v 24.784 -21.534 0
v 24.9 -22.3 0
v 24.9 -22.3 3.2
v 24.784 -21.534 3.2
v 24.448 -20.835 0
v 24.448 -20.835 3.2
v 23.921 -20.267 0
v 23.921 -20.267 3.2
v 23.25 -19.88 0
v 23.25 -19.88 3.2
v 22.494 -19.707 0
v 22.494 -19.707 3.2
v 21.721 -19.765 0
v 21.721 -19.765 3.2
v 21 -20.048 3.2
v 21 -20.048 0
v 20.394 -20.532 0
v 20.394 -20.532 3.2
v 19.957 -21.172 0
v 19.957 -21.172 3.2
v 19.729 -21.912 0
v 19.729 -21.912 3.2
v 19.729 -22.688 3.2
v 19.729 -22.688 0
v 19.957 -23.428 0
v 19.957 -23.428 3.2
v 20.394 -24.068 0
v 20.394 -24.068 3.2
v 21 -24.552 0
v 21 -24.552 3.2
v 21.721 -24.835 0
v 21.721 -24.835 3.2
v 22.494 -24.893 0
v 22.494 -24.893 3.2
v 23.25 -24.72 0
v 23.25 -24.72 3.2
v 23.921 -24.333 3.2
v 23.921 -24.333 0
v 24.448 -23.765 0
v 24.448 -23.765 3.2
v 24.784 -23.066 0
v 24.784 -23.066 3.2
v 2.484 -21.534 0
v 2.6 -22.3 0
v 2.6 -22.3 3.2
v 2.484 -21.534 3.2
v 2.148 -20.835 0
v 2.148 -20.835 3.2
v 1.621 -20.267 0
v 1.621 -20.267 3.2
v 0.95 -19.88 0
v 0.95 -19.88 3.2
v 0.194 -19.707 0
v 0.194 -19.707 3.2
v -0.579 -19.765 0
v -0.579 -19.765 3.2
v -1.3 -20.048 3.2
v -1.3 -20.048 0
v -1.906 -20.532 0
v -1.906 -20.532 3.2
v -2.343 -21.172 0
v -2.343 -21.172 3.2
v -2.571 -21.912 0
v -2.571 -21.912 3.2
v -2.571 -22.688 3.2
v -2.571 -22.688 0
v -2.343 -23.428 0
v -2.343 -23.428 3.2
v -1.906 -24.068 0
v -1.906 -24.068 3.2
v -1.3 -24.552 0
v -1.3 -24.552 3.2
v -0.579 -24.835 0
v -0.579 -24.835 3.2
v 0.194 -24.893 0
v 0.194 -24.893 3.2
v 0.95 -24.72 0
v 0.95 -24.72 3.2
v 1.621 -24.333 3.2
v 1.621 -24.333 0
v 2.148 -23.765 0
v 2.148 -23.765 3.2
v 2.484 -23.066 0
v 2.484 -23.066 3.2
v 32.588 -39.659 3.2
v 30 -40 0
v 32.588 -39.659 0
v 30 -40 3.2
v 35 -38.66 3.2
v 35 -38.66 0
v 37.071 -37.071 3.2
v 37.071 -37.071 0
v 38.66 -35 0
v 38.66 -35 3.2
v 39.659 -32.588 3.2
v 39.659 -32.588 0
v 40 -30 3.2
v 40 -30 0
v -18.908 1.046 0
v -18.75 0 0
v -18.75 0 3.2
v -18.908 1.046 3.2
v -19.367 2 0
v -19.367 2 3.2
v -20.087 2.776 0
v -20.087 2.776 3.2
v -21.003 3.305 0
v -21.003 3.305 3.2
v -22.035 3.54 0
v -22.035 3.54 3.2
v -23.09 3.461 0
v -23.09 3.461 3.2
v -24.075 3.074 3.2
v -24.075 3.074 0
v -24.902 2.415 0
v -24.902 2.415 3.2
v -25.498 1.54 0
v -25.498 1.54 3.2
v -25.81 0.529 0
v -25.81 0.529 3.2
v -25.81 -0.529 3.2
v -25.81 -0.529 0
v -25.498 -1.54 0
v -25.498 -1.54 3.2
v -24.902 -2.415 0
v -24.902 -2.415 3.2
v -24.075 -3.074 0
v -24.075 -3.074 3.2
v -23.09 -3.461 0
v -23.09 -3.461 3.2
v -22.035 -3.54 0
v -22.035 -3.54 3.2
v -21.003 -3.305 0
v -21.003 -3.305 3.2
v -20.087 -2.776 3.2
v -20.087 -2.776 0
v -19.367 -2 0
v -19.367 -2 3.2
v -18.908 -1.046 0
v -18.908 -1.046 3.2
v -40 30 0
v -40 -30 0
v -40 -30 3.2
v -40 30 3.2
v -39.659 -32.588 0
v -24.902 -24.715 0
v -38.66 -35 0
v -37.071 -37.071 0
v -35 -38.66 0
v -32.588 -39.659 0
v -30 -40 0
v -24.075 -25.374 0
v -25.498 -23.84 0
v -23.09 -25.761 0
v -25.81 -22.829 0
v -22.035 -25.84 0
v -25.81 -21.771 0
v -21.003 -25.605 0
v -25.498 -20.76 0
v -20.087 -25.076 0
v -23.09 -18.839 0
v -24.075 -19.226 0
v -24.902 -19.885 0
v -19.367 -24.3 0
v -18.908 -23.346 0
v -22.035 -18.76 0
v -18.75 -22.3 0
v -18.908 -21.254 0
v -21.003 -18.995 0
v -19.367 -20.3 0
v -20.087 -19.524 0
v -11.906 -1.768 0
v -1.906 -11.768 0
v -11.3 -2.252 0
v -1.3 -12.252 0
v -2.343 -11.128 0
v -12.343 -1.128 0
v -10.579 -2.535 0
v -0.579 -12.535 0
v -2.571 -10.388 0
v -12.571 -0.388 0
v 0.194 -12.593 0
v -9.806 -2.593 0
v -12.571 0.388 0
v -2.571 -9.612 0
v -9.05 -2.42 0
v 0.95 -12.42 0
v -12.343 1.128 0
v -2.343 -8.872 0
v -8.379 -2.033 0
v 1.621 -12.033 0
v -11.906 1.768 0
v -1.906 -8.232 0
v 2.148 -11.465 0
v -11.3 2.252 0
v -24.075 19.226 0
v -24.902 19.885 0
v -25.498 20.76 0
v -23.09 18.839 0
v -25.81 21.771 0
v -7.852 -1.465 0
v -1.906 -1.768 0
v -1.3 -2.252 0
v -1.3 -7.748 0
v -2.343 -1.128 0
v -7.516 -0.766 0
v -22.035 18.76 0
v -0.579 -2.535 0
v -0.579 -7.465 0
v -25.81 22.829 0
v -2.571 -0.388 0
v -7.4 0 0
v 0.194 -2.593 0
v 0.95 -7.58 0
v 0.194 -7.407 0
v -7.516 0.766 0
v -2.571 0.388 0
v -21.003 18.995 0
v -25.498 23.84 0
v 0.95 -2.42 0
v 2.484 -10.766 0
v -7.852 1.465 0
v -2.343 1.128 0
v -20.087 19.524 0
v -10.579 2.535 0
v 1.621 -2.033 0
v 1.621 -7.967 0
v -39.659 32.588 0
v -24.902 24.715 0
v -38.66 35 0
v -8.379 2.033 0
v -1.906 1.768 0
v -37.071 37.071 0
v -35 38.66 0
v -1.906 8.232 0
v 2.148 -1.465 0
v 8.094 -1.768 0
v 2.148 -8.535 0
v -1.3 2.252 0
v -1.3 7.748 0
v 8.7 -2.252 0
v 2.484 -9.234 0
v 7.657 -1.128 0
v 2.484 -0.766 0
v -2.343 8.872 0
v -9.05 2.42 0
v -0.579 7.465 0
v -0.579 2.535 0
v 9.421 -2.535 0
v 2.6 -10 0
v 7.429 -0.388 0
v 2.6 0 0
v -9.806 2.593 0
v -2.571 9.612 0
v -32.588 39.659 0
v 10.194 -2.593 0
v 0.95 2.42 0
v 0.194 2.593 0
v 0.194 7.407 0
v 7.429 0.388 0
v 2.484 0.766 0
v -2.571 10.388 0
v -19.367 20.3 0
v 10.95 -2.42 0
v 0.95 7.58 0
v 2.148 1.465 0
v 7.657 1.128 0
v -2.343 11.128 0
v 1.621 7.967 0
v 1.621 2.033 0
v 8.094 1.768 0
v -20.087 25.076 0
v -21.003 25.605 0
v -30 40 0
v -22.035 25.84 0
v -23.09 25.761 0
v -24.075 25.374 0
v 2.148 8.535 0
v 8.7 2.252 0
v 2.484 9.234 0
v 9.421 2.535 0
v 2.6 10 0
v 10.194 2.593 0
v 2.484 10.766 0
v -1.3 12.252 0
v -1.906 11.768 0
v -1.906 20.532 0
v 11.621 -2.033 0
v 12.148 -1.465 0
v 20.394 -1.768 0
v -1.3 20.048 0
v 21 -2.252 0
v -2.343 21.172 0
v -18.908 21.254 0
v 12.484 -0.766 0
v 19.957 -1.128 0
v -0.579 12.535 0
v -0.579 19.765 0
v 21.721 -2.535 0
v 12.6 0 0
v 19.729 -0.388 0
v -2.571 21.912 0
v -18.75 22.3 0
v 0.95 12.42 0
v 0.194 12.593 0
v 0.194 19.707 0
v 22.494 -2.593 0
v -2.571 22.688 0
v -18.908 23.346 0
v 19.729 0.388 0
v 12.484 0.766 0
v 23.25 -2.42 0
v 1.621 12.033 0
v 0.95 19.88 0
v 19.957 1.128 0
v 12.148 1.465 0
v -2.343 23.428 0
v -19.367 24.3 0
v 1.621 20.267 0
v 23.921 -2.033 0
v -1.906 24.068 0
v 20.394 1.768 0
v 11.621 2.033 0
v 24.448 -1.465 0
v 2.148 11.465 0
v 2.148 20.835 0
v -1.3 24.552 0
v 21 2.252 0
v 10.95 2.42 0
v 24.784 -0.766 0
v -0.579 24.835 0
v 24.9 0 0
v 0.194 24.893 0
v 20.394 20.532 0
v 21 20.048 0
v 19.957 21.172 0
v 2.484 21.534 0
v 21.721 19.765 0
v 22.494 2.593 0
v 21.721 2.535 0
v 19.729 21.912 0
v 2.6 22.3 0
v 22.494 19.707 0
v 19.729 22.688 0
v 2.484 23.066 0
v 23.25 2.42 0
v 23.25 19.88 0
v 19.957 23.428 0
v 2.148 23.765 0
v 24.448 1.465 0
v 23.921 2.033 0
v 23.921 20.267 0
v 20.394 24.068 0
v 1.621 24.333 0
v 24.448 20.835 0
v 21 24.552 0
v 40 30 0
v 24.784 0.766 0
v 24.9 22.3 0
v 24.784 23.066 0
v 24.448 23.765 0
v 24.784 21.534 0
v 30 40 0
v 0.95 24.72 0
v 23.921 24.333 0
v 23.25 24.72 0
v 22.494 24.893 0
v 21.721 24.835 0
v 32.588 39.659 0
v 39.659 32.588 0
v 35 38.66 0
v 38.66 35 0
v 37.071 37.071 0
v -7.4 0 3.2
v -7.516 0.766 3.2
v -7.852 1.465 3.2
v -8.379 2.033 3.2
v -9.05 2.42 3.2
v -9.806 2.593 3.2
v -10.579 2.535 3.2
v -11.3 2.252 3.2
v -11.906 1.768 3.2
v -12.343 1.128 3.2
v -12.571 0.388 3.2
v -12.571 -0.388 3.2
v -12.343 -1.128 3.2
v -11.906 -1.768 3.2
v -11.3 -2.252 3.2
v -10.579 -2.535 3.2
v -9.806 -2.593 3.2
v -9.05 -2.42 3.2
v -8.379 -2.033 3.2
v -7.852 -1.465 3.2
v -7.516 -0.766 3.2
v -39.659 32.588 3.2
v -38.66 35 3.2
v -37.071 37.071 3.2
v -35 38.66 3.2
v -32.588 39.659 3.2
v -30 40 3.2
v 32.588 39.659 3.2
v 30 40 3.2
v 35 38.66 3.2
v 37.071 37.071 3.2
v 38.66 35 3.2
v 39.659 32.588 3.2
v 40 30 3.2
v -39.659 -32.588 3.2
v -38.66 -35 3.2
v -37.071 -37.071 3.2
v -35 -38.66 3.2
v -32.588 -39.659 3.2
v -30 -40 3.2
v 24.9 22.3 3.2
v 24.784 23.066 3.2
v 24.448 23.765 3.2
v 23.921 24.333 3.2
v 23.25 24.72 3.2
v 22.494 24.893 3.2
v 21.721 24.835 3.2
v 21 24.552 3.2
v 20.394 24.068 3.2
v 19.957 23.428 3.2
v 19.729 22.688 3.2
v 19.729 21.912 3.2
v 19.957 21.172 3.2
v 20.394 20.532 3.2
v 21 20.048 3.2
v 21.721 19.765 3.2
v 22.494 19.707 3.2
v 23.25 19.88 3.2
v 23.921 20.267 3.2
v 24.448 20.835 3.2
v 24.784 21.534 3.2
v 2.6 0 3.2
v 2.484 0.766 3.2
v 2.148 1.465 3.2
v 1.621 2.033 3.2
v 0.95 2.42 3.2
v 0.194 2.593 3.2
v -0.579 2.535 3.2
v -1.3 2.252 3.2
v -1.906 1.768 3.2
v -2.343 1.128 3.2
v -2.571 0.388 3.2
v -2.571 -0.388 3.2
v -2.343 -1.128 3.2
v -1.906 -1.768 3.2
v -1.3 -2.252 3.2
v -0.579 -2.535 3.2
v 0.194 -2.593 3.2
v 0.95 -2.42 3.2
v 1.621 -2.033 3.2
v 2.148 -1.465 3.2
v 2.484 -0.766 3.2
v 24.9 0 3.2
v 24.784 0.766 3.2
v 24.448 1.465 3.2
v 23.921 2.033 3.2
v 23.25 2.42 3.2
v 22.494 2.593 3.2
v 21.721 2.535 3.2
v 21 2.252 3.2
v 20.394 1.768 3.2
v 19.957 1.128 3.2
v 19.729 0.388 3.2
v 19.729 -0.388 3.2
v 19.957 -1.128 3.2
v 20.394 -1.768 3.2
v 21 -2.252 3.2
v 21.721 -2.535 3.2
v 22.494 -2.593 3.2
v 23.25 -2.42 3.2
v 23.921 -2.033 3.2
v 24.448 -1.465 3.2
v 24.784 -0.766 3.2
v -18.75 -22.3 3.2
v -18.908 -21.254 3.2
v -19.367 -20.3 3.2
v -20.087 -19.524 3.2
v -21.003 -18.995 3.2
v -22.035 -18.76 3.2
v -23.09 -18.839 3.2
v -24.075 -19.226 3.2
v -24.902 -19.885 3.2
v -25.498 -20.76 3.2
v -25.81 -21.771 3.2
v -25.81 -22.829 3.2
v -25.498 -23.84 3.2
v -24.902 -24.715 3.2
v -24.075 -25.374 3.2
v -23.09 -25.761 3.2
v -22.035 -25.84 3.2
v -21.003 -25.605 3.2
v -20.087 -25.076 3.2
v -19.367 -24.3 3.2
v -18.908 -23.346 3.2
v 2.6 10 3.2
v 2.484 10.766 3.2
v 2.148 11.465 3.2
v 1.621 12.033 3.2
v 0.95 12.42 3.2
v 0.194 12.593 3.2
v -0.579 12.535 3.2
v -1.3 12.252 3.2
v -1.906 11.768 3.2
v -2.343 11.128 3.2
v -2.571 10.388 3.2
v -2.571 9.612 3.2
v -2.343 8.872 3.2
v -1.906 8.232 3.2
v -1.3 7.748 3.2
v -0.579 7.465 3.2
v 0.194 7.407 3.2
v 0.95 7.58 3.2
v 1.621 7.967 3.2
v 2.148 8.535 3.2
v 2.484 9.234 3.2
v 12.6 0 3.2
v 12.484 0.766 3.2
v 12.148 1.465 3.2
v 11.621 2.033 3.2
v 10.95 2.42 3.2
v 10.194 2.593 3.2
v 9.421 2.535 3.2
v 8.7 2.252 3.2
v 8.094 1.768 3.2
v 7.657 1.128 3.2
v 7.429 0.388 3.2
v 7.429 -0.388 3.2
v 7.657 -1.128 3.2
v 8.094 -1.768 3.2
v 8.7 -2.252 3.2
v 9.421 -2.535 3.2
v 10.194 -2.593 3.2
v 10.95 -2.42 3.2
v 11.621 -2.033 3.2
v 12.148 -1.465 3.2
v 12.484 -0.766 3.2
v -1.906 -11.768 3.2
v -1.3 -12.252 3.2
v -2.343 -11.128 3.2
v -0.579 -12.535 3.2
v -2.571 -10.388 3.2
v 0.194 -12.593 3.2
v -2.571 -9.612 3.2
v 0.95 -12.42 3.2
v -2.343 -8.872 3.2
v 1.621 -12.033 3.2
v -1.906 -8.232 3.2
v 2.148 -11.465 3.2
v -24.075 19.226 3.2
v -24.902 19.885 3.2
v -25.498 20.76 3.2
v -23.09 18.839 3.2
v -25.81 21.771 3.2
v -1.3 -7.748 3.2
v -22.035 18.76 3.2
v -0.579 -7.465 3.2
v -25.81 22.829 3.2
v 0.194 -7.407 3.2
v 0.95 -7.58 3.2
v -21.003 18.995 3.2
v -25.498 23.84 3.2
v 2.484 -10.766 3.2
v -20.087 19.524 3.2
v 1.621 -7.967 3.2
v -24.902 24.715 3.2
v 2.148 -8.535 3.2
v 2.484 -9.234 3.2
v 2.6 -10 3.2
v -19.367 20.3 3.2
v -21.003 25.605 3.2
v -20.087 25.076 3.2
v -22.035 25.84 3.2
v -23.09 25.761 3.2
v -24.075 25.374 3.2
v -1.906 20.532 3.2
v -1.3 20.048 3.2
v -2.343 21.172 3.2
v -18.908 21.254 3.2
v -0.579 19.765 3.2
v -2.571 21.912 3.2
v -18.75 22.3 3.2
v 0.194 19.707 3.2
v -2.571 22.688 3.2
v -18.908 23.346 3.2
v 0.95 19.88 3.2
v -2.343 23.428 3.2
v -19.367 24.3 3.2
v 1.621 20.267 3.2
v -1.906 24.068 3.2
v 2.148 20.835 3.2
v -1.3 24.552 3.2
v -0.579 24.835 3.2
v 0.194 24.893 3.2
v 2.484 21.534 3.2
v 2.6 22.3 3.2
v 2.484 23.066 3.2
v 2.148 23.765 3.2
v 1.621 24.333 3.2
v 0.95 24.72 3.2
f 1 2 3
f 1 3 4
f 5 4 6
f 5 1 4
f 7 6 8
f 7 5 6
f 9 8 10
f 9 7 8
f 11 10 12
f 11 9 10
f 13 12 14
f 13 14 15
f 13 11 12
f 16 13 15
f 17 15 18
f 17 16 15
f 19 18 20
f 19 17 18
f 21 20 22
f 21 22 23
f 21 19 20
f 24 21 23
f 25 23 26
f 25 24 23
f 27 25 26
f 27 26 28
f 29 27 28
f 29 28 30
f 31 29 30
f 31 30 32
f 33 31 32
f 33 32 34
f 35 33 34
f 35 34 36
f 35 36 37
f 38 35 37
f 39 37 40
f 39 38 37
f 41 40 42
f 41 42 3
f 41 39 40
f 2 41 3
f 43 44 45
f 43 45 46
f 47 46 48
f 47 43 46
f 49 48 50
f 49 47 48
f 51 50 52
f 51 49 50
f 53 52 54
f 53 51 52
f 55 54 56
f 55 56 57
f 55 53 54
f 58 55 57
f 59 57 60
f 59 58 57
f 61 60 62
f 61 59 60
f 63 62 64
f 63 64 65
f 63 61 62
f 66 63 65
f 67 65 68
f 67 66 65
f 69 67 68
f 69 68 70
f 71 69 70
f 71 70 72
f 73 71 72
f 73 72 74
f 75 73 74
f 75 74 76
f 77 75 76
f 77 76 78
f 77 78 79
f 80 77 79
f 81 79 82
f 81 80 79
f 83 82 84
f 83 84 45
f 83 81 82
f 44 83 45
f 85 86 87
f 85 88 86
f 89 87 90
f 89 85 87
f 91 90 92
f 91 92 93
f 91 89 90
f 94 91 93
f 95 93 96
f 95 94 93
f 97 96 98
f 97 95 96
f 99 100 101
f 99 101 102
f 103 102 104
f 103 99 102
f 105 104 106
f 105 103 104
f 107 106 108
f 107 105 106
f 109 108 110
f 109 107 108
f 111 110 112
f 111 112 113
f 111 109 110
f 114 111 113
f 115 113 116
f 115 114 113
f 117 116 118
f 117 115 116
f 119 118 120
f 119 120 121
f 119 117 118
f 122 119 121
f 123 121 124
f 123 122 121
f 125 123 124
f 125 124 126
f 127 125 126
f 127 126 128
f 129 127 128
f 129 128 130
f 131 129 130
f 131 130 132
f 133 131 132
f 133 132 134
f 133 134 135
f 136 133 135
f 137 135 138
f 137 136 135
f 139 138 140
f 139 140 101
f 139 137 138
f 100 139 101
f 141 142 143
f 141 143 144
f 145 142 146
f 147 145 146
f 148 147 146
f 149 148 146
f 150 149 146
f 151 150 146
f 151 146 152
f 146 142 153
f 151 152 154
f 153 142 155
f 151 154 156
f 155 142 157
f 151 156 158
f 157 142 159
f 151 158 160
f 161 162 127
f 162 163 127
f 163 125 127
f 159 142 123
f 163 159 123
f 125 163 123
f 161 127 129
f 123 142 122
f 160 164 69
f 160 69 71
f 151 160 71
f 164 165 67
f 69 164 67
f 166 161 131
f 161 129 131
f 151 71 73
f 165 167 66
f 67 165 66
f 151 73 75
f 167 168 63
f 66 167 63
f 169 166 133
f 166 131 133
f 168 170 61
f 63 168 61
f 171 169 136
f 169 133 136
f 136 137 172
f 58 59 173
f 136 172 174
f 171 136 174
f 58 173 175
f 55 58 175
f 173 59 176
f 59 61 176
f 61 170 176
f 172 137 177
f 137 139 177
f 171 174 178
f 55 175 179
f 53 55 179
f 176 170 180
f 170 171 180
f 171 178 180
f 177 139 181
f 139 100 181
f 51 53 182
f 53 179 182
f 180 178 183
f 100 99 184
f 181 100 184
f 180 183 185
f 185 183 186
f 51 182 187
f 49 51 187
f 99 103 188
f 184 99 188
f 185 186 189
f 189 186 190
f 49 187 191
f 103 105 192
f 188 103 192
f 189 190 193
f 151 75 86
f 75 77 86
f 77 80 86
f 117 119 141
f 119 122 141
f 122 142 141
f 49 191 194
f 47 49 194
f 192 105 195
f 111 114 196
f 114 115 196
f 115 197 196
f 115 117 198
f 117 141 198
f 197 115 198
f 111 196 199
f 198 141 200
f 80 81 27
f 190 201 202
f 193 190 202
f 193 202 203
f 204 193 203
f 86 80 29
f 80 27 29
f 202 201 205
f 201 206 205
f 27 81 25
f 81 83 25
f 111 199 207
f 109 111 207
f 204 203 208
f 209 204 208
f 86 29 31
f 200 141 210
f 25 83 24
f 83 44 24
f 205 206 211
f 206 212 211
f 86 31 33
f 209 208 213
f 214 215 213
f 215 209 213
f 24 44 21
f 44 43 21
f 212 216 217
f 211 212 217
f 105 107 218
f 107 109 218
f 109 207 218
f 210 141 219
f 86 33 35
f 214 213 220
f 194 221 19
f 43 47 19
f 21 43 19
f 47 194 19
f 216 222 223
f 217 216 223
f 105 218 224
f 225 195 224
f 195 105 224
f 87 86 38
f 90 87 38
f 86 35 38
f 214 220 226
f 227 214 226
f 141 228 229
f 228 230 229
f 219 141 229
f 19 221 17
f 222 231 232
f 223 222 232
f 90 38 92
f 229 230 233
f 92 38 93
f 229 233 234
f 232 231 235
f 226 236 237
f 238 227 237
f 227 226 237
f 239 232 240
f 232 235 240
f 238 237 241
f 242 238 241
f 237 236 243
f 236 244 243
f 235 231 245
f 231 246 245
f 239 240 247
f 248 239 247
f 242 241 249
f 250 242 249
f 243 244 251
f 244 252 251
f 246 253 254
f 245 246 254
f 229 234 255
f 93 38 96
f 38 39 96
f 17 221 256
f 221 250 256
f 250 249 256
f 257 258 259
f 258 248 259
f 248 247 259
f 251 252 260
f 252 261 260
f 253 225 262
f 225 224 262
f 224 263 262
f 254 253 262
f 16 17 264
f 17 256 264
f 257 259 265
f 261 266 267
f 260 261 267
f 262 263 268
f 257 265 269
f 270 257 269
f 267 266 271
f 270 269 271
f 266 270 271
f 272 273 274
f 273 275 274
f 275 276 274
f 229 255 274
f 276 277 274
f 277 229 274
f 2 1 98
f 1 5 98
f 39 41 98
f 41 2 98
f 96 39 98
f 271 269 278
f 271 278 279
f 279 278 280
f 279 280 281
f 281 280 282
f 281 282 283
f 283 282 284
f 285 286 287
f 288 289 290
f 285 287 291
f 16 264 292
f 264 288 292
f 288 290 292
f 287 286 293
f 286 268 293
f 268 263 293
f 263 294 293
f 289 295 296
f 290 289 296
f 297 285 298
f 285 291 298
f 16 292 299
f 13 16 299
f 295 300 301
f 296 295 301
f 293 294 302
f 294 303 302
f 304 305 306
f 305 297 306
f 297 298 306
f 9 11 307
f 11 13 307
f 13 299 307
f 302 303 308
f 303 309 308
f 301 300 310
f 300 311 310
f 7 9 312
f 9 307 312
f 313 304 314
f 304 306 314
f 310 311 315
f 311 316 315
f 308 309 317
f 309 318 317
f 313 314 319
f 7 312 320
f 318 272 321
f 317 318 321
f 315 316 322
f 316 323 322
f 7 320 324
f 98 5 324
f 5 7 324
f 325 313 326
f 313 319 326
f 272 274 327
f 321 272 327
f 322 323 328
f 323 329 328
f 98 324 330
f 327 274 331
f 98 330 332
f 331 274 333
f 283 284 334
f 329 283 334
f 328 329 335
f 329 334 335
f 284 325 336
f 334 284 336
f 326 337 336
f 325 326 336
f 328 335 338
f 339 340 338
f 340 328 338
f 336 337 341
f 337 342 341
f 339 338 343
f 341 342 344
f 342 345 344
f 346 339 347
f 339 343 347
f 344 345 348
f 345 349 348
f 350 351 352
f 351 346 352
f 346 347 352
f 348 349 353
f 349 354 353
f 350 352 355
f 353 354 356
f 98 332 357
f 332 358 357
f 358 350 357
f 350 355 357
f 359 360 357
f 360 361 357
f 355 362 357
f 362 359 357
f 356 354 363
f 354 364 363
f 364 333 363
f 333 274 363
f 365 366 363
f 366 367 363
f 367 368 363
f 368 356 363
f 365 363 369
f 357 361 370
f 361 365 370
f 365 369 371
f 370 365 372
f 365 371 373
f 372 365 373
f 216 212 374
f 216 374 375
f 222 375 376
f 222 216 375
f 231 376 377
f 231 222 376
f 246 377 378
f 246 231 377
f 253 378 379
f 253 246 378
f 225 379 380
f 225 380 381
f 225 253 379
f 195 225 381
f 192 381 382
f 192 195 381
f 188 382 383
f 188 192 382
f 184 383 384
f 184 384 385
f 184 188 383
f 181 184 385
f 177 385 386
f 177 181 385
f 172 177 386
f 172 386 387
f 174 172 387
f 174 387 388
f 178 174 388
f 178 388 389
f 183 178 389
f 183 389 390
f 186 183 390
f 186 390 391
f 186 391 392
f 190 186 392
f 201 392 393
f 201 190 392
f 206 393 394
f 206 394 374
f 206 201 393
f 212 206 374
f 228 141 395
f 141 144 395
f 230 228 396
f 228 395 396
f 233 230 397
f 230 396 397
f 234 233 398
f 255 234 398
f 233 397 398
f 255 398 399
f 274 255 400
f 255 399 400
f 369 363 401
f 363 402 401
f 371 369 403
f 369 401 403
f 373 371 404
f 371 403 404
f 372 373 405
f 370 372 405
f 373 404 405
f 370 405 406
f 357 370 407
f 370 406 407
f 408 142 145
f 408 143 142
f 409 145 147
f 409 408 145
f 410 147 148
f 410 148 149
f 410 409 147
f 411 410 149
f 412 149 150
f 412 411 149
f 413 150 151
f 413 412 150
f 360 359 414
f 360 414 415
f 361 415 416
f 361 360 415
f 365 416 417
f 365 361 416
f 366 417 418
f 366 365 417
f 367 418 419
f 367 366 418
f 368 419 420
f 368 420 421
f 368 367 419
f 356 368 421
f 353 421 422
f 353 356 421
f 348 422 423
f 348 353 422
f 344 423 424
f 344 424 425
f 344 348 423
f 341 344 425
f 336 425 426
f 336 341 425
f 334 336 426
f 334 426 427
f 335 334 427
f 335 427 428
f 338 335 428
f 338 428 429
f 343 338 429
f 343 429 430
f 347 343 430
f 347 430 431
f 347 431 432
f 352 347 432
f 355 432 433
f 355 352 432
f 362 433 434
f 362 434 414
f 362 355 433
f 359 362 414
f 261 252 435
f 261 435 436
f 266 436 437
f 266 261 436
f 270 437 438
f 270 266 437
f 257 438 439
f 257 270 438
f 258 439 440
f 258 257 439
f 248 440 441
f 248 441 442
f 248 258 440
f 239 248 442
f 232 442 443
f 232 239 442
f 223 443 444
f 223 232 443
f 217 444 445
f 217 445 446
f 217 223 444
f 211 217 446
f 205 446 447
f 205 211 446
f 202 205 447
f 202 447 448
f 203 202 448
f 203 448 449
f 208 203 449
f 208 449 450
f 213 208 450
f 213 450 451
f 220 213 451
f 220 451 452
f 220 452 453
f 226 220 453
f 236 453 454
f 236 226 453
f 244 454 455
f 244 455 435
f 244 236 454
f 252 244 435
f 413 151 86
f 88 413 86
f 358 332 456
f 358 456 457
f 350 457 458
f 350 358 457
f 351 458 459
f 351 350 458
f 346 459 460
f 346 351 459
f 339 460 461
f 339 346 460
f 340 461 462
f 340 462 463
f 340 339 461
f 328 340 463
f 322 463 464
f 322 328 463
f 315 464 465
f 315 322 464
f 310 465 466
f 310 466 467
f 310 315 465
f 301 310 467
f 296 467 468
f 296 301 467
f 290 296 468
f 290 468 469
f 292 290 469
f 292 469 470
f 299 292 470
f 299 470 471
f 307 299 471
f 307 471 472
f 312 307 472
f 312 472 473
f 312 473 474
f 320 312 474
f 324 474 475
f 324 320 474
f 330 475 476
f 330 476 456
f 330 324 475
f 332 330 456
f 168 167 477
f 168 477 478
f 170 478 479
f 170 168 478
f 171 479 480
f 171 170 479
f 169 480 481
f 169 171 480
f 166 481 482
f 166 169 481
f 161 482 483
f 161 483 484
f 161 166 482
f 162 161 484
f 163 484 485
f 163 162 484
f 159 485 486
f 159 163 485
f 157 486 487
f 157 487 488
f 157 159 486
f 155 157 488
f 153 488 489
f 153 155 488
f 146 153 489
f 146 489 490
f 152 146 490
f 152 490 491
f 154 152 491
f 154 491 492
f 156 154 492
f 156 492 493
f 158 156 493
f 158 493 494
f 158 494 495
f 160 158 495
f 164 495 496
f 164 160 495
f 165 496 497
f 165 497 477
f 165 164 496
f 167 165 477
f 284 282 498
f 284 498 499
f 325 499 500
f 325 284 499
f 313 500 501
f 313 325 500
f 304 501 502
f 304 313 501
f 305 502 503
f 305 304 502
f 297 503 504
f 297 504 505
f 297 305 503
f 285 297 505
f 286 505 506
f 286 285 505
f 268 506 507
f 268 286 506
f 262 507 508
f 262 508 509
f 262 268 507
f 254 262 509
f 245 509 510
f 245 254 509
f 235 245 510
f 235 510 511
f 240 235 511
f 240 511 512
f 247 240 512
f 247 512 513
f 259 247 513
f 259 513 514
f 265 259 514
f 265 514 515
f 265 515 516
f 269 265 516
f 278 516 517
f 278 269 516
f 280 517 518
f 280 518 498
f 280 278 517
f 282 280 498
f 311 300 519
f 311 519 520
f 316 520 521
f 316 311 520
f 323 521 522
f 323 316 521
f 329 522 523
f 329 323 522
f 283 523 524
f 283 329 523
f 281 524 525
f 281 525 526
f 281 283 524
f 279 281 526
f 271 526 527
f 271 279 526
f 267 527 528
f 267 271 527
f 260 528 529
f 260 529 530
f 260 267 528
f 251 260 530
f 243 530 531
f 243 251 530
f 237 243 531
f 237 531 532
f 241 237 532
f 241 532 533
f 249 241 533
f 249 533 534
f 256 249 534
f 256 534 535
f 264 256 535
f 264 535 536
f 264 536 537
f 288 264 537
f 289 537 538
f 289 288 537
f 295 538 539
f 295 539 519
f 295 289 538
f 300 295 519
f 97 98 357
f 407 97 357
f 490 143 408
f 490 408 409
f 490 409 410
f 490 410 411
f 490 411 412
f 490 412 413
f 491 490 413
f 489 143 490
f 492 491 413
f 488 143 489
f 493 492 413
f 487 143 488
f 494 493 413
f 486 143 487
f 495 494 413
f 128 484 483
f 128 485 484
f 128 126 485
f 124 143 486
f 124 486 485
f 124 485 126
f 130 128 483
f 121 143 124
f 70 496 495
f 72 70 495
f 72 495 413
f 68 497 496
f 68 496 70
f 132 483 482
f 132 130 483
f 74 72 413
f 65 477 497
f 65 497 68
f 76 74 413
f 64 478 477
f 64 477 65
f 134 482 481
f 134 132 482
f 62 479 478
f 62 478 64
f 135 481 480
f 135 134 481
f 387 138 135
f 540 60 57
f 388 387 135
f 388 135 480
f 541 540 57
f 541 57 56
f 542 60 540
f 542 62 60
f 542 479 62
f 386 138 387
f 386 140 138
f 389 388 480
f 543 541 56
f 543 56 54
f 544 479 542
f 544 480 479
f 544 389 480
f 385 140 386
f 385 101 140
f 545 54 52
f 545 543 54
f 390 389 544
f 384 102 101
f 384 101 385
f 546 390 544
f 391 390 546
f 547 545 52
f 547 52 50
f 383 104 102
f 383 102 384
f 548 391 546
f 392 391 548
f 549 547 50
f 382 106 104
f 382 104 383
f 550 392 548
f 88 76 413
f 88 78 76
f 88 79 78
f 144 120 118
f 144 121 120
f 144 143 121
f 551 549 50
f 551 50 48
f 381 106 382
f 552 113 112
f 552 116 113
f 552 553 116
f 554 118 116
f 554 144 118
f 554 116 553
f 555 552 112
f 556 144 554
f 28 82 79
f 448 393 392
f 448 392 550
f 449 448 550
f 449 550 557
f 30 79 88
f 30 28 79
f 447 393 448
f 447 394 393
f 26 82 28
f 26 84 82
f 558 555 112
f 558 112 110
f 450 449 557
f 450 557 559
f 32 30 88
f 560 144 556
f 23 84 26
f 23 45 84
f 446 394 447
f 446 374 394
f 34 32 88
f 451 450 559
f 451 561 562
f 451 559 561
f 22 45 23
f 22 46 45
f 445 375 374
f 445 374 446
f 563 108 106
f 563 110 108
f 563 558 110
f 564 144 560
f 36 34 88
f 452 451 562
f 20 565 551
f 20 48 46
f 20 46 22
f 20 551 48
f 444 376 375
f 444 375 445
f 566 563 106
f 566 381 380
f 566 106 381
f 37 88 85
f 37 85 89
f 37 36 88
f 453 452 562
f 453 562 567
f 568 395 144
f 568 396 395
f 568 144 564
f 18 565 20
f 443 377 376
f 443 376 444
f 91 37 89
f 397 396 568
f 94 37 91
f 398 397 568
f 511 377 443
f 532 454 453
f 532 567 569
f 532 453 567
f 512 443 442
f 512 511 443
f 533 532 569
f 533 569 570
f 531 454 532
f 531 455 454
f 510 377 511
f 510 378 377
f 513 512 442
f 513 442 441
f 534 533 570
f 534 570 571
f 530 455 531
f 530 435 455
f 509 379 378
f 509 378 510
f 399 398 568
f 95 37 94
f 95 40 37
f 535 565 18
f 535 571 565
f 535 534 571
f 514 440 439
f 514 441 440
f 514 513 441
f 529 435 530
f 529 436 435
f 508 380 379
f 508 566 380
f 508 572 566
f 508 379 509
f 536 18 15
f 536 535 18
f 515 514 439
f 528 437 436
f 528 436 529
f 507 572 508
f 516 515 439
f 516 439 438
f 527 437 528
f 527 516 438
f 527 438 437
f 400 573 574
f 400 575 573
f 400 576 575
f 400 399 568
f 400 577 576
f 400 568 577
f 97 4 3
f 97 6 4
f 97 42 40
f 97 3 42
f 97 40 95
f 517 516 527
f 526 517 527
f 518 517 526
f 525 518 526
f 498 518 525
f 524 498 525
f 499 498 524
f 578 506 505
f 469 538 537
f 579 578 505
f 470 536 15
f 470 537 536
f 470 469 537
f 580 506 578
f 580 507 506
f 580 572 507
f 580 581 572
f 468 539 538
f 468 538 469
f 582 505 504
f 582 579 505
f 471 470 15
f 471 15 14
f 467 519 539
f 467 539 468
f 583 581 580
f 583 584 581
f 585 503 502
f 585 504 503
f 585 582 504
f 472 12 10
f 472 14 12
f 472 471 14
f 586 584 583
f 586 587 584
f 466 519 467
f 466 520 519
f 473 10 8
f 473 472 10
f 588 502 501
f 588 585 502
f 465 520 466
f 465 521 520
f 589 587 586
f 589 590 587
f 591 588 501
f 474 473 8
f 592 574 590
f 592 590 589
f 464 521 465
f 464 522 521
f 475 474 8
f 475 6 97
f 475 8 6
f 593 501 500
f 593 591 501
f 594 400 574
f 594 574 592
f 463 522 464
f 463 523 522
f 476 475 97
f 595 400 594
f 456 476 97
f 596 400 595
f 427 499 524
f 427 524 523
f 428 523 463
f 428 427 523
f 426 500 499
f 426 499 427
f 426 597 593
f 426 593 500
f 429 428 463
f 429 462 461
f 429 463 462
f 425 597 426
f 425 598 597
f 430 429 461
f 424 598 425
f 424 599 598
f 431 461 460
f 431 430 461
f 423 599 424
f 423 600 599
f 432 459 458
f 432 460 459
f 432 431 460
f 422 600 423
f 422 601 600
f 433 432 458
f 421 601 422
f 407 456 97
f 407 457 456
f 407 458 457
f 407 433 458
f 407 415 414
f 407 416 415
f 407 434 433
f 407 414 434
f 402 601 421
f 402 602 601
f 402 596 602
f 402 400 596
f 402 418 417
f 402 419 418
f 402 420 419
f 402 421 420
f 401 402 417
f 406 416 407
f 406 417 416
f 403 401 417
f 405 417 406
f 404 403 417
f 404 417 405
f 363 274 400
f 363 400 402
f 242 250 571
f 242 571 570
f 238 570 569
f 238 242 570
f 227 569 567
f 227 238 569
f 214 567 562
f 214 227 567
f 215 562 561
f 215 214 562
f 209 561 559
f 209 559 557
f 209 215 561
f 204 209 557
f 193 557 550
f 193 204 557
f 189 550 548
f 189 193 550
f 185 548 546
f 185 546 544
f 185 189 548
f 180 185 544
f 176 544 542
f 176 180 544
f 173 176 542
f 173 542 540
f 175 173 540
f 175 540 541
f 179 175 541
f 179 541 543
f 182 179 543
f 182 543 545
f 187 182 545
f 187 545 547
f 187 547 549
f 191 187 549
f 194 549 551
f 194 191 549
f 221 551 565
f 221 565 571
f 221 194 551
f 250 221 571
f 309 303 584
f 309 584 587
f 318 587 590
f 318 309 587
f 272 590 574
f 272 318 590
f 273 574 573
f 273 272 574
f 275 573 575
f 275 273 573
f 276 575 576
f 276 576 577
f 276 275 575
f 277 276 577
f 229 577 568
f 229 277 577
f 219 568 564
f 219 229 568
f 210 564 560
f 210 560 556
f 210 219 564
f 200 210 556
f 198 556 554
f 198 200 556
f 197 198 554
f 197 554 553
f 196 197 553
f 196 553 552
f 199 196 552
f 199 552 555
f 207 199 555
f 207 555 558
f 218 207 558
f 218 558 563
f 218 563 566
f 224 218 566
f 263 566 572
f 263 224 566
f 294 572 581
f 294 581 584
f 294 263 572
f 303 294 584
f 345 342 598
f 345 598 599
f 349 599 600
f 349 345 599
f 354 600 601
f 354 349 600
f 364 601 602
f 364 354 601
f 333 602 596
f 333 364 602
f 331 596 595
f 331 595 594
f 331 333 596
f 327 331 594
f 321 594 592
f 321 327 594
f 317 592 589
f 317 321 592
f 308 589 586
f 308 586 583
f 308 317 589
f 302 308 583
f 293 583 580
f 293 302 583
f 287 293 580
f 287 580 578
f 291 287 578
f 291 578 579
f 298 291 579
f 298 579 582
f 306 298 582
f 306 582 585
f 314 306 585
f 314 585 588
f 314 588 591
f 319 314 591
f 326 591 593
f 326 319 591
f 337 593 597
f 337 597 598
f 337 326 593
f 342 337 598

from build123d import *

# Parameters (mm, degrees)
SKETCH1_W           = 80
SKETCH1_H           = 80
SKETCH1_R           = 2.6
SKETCH1_R_2         = 3.55
BOSS_EXTRUDE1_DEPTH = 3.2
FILLET1_R           = 10


with BuildPart() as part:
    # Sketch1 → Boss-Extrude1 (new body)
    with BuildSketch(Plane.XY):
        Rectangle(SKETCH1_W, SKETCH1_H)
        Circle(SKETCH1_R, mode=Mode.SUBTRACT)
        with Locations((0, 10)):
            Circle(SKETCH1_R, mode=Mode.SUBTRACT)
        with Locations((0, 22.3)):
            Circle(SKETCH1_R, mode=Mode.SUBTRACT)
        with Locations((0, -10)):
            Circle(SKETCH1_R, mode=Mode.SUBTRACT)
        with Locations((0, -22.3)):
            Circle(SKETCH1_R, mode=Mode.SUBTRACT)
        with Locations((10, 0)):
            Circle(SKETCH1_R, mode=Mode.SUBTRACT)
        with Locations((-10, 0)):
            Circle(SKETCH1_R, mode=Mode.SUBTRACT)
        with Locations((-22.3, 0)):
            Circle(SKETCH1_R_2, mode=Mode.SUBTRACT)
        with Locations((22.3, 0)):
            Circle(SKETCH1_R, mode=Mode.SUBTRACT)
        with Locations((22.3, 22.3)):
            Circle(SKETCH1_R, mode=Mode.SUBTRACT)
        with Locations((22.3, -22.3)):
            Circle(SKETCH1_R, mode=Mode.SUBTRACT)
        with Locations((-22.3, -22.3)):
            Circle(SKETCH1_R_2, mode=Mode.SUBTRACT)
        with Locations((-22.3, 22.3)):
            Circle(SKETCH1_R_2, mode=Mode.SUBTRACT)
    extrude(amount=BOSS_EXTRUDE1_DEPTH)

    # Fillet1
    fillet1_edges = [part.edges().sort_by_distance(p)[0] for p in [
        (40, -40, 1.6),
        (-40, -40, 1.6),
        (-40, 40, 1.6),
        (40, 40, 1.6),
    ]]
    fillet(fillet1_edges, radius=FILLET1_R)


solid = part.part
